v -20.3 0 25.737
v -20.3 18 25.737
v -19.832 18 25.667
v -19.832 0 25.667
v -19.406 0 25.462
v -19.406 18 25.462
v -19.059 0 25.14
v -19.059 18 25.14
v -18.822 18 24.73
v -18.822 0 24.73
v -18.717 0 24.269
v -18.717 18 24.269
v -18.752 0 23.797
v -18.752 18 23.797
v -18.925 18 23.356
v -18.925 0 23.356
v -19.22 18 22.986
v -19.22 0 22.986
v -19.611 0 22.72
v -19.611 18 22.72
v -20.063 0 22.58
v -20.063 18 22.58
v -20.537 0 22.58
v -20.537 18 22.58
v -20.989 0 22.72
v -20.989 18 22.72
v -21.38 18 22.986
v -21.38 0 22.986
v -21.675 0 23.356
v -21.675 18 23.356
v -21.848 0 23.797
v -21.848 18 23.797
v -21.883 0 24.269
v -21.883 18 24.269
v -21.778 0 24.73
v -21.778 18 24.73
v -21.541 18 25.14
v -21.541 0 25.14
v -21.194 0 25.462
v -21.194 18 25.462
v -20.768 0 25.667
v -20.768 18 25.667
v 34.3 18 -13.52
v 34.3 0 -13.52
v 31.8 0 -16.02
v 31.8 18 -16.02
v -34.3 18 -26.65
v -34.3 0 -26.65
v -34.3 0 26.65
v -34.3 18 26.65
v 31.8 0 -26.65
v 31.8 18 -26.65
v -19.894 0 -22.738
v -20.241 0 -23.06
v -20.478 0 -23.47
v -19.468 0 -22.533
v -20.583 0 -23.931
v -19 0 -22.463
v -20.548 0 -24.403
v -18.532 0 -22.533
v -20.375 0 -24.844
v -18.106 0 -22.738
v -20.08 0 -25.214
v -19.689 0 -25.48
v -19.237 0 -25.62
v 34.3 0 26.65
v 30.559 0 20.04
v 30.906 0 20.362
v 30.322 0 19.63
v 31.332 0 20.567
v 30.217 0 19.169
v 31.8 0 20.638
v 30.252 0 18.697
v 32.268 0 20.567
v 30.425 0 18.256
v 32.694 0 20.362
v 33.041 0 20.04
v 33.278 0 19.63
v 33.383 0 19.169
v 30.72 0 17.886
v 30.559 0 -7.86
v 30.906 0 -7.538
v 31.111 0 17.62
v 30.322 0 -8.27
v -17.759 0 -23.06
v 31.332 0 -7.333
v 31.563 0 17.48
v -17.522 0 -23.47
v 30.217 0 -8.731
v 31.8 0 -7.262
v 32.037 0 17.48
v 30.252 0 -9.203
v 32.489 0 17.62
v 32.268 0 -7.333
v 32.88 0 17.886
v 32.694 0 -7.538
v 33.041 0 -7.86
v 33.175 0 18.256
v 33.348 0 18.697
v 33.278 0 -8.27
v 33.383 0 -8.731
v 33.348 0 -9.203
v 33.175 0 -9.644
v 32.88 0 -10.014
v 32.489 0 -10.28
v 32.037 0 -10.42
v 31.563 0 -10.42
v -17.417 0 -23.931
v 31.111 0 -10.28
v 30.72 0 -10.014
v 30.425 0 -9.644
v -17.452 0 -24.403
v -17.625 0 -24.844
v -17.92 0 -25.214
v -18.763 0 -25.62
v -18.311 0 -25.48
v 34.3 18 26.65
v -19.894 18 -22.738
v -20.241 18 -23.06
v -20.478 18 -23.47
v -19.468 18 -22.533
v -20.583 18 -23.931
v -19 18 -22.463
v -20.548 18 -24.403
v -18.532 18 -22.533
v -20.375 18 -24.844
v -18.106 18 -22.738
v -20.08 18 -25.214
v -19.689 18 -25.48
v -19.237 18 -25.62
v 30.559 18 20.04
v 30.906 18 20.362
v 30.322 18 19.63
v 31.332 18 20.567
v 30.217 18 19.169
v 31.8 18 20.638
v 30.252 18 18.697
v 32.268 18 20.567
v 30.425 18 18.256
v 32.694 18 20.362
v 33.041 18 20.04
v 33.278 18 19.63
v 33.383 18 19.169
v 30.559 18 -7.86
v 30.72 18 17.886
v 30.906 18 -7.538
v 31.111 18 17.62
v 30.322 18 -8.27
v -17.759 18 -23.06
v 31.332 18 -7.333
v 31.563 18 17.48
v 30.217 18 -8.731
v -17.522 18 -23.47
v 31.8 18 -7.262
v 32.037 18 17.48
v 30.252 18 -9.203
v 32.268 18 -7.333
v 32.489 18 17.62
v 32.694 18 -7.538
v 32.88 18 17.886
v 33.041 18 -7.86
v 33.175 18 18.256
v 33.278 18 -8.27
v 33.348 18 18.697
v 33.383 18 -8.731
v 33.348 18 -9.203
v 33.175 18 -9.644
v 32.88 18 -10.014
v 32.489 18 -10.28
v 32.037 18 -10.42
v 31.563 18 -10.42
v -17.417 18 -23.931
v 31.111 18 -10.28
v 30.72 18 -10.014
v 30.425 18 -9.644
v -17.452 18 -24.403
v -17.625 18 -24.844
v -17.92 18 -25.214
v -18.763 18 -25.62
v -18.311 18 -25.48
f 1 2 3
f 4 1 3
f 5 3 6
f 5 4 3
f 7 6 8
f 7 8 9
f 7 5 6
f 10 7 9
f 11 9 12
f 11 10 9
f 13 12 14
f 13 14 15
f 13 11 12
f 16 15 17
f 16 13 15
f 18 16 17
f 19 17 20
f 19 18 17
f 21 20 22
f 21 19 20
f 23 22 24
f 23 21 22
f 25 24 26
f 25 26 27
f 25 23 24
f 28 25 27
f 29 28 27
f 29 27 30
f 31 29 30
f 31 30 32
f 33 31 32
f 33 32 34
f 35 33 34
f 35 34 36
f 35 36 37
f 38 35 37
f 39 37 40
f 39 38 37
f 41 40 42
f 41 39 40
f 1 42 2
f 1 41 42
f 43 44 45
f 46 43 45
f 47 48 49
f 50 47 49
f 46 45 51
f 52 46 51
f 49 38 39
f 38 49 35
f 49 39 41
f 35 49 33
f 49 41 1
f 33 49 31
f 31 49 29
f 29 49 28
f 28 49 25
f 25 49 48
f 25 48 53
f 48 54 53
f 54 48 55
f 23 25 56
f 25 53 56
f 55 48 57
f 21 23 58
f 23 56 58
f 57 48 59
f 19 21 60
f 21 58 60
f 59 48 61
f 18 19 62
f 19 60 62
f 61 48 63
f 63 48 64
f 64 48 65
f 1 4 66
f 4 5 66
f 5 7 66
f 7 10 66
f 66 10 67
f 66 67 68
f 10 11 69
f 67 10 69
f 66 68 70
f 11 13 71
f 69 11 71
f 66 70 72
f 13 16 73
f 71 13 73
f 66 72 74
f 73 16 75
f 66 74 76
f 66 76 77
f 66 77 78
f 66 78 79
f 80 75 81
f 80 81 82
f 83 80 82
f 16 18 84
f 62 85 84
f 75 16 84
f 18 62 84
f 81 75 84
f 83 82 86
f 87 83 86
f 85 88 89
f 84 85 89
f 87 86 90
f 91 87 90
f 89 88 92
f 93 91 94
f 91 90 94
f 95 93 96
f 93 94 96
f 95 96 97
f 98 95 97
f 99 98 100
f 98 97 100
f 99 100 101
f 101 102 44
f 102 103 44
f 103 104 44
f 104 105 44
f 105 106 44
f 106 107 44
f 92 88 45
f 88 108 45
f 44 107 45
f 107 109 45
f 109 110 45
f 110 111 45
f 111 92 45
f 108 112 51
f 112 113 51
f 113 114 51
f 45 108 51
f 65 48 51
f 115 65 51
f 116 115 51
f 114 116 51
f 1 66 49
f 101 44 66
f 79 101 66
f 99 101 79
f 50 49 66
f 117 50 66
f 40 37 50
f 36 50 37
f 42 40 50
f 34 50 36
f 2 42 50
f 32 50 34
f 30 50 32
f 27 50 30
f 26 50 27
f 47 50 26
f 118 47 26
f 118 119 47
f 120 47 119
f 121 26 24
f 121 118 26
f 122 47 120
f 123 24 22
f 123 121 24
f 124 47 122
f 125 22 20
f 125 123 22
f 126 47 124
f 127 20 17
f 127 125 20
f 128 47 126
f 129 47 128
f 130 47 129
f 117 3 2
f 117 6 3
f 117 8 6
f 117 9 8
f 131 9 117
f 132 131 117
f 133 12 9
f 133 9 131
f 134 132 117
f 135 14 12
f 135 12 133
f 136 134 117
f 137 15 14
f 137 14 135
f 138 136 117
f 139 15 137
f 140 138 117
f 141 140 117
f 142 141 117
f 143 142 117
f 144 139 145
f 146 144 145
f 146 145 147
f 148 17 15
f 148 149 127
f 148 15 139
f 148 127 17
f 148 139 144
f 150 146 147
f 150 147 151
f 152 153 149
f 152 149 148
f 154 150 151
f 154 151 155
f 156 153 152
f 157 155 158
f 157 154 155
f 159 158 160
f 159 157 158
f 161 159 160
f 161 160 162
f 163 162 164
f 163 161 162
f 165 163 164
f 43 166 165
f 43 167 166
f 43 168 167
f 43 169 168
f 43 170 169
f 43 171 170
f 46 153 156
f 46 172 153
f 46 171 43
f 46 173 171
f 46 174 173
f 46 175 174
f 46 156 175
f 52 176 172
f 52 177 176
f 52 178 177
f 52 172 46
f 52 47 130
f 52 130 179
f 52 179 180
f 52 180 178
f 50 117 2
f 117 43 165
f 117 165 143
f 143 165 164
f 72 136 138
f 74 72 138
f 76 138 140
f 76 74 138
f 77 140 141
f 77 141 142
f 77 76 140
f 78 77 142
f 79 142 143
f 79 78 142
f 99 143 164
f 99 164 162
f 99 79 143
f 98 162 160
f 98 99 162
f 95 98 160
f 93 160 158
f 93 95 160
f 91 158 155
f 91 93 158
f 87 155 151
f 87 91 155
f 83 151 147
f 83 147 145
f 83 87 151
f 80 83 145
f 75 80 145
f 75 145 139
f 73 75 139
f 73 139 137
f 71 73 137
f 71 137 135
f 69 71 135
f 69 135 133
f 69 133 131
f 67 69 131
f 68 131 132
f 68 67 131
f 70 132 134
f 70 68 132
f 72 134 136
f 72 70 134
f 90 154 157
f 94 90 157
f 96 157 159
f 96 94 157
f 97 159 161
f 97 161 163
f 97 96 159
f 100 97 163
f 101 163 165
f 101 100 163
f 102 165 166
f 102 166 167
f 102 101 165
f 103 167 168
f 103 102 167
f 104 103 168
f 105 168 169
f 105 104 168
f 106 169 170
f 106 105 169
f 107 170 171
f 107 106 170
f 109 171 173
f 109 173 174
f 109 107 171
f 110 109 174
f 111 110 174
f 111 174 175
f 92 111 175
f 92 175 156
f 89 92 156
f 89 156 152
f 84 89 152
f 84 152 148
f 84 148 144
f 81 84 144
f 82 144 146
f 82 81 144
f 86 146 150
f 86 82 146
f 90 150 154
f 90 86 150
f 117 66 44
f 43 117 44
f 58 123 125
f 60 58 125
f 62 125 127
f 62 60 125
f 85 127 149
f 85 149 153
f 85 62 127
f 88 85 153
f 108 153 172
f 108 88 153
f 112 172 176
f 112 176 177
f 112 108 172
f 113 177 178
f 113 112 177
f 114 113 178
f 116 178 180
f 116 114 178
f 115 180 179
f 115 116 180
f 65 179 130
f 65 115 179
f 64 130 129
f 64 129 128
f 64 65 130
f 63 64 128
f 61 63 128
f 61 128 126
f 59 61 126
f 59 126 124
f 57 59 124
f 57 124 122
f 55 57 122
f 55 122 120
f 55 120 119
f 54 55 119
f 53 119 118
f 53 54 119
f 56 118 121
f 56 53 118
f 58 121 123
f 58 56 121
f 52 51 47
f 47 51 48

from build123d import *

# Parameters (mm, degrees)
SKETCH_1_R      = 1.5875
EXTRUDE_1_DEPTH = 18


with BuildPart() as part:
    # 草图1 → 凸台-拉伸1 (new body)
    with BuildSketch(Plane(origin=(0, 0, 0), x_dir=(1, 0, 0), z_dir=(0, 1, 0))):
        Polygon((31.8, 26.65), (-34.3, 26.65), (-34.3, -26.65), (34.3, -26.65), (34.3, 13.519706399), (31.8, 16.019706399), align=None)
        with Locations(Location((-20.3, -24.15, 0), (0, 0, 270))):
            Circle(SKETCH_1_R, mode=Mode.SUBTRACT)
        with Locations(Location((31.8, -19.05, 0), (0, 0, 270))):
            Circle(SKETCH_1_R, mode=Mode.SUBTRACT)
        with Locations(Location((-19, 24.05, 0), (0, 0, 270))):
            Circle(SKETCH_1_R, mode=Mode.SUBTRACT)
        with Locations(Location((31.8, 8.85, 0), (0, 0, 270))):
            Circle(SKETCH_1_R, mode=Mode.SUBTRACT)
    extrude(amount=EXTRUDE_1_DEPTH)


solid = part.part
